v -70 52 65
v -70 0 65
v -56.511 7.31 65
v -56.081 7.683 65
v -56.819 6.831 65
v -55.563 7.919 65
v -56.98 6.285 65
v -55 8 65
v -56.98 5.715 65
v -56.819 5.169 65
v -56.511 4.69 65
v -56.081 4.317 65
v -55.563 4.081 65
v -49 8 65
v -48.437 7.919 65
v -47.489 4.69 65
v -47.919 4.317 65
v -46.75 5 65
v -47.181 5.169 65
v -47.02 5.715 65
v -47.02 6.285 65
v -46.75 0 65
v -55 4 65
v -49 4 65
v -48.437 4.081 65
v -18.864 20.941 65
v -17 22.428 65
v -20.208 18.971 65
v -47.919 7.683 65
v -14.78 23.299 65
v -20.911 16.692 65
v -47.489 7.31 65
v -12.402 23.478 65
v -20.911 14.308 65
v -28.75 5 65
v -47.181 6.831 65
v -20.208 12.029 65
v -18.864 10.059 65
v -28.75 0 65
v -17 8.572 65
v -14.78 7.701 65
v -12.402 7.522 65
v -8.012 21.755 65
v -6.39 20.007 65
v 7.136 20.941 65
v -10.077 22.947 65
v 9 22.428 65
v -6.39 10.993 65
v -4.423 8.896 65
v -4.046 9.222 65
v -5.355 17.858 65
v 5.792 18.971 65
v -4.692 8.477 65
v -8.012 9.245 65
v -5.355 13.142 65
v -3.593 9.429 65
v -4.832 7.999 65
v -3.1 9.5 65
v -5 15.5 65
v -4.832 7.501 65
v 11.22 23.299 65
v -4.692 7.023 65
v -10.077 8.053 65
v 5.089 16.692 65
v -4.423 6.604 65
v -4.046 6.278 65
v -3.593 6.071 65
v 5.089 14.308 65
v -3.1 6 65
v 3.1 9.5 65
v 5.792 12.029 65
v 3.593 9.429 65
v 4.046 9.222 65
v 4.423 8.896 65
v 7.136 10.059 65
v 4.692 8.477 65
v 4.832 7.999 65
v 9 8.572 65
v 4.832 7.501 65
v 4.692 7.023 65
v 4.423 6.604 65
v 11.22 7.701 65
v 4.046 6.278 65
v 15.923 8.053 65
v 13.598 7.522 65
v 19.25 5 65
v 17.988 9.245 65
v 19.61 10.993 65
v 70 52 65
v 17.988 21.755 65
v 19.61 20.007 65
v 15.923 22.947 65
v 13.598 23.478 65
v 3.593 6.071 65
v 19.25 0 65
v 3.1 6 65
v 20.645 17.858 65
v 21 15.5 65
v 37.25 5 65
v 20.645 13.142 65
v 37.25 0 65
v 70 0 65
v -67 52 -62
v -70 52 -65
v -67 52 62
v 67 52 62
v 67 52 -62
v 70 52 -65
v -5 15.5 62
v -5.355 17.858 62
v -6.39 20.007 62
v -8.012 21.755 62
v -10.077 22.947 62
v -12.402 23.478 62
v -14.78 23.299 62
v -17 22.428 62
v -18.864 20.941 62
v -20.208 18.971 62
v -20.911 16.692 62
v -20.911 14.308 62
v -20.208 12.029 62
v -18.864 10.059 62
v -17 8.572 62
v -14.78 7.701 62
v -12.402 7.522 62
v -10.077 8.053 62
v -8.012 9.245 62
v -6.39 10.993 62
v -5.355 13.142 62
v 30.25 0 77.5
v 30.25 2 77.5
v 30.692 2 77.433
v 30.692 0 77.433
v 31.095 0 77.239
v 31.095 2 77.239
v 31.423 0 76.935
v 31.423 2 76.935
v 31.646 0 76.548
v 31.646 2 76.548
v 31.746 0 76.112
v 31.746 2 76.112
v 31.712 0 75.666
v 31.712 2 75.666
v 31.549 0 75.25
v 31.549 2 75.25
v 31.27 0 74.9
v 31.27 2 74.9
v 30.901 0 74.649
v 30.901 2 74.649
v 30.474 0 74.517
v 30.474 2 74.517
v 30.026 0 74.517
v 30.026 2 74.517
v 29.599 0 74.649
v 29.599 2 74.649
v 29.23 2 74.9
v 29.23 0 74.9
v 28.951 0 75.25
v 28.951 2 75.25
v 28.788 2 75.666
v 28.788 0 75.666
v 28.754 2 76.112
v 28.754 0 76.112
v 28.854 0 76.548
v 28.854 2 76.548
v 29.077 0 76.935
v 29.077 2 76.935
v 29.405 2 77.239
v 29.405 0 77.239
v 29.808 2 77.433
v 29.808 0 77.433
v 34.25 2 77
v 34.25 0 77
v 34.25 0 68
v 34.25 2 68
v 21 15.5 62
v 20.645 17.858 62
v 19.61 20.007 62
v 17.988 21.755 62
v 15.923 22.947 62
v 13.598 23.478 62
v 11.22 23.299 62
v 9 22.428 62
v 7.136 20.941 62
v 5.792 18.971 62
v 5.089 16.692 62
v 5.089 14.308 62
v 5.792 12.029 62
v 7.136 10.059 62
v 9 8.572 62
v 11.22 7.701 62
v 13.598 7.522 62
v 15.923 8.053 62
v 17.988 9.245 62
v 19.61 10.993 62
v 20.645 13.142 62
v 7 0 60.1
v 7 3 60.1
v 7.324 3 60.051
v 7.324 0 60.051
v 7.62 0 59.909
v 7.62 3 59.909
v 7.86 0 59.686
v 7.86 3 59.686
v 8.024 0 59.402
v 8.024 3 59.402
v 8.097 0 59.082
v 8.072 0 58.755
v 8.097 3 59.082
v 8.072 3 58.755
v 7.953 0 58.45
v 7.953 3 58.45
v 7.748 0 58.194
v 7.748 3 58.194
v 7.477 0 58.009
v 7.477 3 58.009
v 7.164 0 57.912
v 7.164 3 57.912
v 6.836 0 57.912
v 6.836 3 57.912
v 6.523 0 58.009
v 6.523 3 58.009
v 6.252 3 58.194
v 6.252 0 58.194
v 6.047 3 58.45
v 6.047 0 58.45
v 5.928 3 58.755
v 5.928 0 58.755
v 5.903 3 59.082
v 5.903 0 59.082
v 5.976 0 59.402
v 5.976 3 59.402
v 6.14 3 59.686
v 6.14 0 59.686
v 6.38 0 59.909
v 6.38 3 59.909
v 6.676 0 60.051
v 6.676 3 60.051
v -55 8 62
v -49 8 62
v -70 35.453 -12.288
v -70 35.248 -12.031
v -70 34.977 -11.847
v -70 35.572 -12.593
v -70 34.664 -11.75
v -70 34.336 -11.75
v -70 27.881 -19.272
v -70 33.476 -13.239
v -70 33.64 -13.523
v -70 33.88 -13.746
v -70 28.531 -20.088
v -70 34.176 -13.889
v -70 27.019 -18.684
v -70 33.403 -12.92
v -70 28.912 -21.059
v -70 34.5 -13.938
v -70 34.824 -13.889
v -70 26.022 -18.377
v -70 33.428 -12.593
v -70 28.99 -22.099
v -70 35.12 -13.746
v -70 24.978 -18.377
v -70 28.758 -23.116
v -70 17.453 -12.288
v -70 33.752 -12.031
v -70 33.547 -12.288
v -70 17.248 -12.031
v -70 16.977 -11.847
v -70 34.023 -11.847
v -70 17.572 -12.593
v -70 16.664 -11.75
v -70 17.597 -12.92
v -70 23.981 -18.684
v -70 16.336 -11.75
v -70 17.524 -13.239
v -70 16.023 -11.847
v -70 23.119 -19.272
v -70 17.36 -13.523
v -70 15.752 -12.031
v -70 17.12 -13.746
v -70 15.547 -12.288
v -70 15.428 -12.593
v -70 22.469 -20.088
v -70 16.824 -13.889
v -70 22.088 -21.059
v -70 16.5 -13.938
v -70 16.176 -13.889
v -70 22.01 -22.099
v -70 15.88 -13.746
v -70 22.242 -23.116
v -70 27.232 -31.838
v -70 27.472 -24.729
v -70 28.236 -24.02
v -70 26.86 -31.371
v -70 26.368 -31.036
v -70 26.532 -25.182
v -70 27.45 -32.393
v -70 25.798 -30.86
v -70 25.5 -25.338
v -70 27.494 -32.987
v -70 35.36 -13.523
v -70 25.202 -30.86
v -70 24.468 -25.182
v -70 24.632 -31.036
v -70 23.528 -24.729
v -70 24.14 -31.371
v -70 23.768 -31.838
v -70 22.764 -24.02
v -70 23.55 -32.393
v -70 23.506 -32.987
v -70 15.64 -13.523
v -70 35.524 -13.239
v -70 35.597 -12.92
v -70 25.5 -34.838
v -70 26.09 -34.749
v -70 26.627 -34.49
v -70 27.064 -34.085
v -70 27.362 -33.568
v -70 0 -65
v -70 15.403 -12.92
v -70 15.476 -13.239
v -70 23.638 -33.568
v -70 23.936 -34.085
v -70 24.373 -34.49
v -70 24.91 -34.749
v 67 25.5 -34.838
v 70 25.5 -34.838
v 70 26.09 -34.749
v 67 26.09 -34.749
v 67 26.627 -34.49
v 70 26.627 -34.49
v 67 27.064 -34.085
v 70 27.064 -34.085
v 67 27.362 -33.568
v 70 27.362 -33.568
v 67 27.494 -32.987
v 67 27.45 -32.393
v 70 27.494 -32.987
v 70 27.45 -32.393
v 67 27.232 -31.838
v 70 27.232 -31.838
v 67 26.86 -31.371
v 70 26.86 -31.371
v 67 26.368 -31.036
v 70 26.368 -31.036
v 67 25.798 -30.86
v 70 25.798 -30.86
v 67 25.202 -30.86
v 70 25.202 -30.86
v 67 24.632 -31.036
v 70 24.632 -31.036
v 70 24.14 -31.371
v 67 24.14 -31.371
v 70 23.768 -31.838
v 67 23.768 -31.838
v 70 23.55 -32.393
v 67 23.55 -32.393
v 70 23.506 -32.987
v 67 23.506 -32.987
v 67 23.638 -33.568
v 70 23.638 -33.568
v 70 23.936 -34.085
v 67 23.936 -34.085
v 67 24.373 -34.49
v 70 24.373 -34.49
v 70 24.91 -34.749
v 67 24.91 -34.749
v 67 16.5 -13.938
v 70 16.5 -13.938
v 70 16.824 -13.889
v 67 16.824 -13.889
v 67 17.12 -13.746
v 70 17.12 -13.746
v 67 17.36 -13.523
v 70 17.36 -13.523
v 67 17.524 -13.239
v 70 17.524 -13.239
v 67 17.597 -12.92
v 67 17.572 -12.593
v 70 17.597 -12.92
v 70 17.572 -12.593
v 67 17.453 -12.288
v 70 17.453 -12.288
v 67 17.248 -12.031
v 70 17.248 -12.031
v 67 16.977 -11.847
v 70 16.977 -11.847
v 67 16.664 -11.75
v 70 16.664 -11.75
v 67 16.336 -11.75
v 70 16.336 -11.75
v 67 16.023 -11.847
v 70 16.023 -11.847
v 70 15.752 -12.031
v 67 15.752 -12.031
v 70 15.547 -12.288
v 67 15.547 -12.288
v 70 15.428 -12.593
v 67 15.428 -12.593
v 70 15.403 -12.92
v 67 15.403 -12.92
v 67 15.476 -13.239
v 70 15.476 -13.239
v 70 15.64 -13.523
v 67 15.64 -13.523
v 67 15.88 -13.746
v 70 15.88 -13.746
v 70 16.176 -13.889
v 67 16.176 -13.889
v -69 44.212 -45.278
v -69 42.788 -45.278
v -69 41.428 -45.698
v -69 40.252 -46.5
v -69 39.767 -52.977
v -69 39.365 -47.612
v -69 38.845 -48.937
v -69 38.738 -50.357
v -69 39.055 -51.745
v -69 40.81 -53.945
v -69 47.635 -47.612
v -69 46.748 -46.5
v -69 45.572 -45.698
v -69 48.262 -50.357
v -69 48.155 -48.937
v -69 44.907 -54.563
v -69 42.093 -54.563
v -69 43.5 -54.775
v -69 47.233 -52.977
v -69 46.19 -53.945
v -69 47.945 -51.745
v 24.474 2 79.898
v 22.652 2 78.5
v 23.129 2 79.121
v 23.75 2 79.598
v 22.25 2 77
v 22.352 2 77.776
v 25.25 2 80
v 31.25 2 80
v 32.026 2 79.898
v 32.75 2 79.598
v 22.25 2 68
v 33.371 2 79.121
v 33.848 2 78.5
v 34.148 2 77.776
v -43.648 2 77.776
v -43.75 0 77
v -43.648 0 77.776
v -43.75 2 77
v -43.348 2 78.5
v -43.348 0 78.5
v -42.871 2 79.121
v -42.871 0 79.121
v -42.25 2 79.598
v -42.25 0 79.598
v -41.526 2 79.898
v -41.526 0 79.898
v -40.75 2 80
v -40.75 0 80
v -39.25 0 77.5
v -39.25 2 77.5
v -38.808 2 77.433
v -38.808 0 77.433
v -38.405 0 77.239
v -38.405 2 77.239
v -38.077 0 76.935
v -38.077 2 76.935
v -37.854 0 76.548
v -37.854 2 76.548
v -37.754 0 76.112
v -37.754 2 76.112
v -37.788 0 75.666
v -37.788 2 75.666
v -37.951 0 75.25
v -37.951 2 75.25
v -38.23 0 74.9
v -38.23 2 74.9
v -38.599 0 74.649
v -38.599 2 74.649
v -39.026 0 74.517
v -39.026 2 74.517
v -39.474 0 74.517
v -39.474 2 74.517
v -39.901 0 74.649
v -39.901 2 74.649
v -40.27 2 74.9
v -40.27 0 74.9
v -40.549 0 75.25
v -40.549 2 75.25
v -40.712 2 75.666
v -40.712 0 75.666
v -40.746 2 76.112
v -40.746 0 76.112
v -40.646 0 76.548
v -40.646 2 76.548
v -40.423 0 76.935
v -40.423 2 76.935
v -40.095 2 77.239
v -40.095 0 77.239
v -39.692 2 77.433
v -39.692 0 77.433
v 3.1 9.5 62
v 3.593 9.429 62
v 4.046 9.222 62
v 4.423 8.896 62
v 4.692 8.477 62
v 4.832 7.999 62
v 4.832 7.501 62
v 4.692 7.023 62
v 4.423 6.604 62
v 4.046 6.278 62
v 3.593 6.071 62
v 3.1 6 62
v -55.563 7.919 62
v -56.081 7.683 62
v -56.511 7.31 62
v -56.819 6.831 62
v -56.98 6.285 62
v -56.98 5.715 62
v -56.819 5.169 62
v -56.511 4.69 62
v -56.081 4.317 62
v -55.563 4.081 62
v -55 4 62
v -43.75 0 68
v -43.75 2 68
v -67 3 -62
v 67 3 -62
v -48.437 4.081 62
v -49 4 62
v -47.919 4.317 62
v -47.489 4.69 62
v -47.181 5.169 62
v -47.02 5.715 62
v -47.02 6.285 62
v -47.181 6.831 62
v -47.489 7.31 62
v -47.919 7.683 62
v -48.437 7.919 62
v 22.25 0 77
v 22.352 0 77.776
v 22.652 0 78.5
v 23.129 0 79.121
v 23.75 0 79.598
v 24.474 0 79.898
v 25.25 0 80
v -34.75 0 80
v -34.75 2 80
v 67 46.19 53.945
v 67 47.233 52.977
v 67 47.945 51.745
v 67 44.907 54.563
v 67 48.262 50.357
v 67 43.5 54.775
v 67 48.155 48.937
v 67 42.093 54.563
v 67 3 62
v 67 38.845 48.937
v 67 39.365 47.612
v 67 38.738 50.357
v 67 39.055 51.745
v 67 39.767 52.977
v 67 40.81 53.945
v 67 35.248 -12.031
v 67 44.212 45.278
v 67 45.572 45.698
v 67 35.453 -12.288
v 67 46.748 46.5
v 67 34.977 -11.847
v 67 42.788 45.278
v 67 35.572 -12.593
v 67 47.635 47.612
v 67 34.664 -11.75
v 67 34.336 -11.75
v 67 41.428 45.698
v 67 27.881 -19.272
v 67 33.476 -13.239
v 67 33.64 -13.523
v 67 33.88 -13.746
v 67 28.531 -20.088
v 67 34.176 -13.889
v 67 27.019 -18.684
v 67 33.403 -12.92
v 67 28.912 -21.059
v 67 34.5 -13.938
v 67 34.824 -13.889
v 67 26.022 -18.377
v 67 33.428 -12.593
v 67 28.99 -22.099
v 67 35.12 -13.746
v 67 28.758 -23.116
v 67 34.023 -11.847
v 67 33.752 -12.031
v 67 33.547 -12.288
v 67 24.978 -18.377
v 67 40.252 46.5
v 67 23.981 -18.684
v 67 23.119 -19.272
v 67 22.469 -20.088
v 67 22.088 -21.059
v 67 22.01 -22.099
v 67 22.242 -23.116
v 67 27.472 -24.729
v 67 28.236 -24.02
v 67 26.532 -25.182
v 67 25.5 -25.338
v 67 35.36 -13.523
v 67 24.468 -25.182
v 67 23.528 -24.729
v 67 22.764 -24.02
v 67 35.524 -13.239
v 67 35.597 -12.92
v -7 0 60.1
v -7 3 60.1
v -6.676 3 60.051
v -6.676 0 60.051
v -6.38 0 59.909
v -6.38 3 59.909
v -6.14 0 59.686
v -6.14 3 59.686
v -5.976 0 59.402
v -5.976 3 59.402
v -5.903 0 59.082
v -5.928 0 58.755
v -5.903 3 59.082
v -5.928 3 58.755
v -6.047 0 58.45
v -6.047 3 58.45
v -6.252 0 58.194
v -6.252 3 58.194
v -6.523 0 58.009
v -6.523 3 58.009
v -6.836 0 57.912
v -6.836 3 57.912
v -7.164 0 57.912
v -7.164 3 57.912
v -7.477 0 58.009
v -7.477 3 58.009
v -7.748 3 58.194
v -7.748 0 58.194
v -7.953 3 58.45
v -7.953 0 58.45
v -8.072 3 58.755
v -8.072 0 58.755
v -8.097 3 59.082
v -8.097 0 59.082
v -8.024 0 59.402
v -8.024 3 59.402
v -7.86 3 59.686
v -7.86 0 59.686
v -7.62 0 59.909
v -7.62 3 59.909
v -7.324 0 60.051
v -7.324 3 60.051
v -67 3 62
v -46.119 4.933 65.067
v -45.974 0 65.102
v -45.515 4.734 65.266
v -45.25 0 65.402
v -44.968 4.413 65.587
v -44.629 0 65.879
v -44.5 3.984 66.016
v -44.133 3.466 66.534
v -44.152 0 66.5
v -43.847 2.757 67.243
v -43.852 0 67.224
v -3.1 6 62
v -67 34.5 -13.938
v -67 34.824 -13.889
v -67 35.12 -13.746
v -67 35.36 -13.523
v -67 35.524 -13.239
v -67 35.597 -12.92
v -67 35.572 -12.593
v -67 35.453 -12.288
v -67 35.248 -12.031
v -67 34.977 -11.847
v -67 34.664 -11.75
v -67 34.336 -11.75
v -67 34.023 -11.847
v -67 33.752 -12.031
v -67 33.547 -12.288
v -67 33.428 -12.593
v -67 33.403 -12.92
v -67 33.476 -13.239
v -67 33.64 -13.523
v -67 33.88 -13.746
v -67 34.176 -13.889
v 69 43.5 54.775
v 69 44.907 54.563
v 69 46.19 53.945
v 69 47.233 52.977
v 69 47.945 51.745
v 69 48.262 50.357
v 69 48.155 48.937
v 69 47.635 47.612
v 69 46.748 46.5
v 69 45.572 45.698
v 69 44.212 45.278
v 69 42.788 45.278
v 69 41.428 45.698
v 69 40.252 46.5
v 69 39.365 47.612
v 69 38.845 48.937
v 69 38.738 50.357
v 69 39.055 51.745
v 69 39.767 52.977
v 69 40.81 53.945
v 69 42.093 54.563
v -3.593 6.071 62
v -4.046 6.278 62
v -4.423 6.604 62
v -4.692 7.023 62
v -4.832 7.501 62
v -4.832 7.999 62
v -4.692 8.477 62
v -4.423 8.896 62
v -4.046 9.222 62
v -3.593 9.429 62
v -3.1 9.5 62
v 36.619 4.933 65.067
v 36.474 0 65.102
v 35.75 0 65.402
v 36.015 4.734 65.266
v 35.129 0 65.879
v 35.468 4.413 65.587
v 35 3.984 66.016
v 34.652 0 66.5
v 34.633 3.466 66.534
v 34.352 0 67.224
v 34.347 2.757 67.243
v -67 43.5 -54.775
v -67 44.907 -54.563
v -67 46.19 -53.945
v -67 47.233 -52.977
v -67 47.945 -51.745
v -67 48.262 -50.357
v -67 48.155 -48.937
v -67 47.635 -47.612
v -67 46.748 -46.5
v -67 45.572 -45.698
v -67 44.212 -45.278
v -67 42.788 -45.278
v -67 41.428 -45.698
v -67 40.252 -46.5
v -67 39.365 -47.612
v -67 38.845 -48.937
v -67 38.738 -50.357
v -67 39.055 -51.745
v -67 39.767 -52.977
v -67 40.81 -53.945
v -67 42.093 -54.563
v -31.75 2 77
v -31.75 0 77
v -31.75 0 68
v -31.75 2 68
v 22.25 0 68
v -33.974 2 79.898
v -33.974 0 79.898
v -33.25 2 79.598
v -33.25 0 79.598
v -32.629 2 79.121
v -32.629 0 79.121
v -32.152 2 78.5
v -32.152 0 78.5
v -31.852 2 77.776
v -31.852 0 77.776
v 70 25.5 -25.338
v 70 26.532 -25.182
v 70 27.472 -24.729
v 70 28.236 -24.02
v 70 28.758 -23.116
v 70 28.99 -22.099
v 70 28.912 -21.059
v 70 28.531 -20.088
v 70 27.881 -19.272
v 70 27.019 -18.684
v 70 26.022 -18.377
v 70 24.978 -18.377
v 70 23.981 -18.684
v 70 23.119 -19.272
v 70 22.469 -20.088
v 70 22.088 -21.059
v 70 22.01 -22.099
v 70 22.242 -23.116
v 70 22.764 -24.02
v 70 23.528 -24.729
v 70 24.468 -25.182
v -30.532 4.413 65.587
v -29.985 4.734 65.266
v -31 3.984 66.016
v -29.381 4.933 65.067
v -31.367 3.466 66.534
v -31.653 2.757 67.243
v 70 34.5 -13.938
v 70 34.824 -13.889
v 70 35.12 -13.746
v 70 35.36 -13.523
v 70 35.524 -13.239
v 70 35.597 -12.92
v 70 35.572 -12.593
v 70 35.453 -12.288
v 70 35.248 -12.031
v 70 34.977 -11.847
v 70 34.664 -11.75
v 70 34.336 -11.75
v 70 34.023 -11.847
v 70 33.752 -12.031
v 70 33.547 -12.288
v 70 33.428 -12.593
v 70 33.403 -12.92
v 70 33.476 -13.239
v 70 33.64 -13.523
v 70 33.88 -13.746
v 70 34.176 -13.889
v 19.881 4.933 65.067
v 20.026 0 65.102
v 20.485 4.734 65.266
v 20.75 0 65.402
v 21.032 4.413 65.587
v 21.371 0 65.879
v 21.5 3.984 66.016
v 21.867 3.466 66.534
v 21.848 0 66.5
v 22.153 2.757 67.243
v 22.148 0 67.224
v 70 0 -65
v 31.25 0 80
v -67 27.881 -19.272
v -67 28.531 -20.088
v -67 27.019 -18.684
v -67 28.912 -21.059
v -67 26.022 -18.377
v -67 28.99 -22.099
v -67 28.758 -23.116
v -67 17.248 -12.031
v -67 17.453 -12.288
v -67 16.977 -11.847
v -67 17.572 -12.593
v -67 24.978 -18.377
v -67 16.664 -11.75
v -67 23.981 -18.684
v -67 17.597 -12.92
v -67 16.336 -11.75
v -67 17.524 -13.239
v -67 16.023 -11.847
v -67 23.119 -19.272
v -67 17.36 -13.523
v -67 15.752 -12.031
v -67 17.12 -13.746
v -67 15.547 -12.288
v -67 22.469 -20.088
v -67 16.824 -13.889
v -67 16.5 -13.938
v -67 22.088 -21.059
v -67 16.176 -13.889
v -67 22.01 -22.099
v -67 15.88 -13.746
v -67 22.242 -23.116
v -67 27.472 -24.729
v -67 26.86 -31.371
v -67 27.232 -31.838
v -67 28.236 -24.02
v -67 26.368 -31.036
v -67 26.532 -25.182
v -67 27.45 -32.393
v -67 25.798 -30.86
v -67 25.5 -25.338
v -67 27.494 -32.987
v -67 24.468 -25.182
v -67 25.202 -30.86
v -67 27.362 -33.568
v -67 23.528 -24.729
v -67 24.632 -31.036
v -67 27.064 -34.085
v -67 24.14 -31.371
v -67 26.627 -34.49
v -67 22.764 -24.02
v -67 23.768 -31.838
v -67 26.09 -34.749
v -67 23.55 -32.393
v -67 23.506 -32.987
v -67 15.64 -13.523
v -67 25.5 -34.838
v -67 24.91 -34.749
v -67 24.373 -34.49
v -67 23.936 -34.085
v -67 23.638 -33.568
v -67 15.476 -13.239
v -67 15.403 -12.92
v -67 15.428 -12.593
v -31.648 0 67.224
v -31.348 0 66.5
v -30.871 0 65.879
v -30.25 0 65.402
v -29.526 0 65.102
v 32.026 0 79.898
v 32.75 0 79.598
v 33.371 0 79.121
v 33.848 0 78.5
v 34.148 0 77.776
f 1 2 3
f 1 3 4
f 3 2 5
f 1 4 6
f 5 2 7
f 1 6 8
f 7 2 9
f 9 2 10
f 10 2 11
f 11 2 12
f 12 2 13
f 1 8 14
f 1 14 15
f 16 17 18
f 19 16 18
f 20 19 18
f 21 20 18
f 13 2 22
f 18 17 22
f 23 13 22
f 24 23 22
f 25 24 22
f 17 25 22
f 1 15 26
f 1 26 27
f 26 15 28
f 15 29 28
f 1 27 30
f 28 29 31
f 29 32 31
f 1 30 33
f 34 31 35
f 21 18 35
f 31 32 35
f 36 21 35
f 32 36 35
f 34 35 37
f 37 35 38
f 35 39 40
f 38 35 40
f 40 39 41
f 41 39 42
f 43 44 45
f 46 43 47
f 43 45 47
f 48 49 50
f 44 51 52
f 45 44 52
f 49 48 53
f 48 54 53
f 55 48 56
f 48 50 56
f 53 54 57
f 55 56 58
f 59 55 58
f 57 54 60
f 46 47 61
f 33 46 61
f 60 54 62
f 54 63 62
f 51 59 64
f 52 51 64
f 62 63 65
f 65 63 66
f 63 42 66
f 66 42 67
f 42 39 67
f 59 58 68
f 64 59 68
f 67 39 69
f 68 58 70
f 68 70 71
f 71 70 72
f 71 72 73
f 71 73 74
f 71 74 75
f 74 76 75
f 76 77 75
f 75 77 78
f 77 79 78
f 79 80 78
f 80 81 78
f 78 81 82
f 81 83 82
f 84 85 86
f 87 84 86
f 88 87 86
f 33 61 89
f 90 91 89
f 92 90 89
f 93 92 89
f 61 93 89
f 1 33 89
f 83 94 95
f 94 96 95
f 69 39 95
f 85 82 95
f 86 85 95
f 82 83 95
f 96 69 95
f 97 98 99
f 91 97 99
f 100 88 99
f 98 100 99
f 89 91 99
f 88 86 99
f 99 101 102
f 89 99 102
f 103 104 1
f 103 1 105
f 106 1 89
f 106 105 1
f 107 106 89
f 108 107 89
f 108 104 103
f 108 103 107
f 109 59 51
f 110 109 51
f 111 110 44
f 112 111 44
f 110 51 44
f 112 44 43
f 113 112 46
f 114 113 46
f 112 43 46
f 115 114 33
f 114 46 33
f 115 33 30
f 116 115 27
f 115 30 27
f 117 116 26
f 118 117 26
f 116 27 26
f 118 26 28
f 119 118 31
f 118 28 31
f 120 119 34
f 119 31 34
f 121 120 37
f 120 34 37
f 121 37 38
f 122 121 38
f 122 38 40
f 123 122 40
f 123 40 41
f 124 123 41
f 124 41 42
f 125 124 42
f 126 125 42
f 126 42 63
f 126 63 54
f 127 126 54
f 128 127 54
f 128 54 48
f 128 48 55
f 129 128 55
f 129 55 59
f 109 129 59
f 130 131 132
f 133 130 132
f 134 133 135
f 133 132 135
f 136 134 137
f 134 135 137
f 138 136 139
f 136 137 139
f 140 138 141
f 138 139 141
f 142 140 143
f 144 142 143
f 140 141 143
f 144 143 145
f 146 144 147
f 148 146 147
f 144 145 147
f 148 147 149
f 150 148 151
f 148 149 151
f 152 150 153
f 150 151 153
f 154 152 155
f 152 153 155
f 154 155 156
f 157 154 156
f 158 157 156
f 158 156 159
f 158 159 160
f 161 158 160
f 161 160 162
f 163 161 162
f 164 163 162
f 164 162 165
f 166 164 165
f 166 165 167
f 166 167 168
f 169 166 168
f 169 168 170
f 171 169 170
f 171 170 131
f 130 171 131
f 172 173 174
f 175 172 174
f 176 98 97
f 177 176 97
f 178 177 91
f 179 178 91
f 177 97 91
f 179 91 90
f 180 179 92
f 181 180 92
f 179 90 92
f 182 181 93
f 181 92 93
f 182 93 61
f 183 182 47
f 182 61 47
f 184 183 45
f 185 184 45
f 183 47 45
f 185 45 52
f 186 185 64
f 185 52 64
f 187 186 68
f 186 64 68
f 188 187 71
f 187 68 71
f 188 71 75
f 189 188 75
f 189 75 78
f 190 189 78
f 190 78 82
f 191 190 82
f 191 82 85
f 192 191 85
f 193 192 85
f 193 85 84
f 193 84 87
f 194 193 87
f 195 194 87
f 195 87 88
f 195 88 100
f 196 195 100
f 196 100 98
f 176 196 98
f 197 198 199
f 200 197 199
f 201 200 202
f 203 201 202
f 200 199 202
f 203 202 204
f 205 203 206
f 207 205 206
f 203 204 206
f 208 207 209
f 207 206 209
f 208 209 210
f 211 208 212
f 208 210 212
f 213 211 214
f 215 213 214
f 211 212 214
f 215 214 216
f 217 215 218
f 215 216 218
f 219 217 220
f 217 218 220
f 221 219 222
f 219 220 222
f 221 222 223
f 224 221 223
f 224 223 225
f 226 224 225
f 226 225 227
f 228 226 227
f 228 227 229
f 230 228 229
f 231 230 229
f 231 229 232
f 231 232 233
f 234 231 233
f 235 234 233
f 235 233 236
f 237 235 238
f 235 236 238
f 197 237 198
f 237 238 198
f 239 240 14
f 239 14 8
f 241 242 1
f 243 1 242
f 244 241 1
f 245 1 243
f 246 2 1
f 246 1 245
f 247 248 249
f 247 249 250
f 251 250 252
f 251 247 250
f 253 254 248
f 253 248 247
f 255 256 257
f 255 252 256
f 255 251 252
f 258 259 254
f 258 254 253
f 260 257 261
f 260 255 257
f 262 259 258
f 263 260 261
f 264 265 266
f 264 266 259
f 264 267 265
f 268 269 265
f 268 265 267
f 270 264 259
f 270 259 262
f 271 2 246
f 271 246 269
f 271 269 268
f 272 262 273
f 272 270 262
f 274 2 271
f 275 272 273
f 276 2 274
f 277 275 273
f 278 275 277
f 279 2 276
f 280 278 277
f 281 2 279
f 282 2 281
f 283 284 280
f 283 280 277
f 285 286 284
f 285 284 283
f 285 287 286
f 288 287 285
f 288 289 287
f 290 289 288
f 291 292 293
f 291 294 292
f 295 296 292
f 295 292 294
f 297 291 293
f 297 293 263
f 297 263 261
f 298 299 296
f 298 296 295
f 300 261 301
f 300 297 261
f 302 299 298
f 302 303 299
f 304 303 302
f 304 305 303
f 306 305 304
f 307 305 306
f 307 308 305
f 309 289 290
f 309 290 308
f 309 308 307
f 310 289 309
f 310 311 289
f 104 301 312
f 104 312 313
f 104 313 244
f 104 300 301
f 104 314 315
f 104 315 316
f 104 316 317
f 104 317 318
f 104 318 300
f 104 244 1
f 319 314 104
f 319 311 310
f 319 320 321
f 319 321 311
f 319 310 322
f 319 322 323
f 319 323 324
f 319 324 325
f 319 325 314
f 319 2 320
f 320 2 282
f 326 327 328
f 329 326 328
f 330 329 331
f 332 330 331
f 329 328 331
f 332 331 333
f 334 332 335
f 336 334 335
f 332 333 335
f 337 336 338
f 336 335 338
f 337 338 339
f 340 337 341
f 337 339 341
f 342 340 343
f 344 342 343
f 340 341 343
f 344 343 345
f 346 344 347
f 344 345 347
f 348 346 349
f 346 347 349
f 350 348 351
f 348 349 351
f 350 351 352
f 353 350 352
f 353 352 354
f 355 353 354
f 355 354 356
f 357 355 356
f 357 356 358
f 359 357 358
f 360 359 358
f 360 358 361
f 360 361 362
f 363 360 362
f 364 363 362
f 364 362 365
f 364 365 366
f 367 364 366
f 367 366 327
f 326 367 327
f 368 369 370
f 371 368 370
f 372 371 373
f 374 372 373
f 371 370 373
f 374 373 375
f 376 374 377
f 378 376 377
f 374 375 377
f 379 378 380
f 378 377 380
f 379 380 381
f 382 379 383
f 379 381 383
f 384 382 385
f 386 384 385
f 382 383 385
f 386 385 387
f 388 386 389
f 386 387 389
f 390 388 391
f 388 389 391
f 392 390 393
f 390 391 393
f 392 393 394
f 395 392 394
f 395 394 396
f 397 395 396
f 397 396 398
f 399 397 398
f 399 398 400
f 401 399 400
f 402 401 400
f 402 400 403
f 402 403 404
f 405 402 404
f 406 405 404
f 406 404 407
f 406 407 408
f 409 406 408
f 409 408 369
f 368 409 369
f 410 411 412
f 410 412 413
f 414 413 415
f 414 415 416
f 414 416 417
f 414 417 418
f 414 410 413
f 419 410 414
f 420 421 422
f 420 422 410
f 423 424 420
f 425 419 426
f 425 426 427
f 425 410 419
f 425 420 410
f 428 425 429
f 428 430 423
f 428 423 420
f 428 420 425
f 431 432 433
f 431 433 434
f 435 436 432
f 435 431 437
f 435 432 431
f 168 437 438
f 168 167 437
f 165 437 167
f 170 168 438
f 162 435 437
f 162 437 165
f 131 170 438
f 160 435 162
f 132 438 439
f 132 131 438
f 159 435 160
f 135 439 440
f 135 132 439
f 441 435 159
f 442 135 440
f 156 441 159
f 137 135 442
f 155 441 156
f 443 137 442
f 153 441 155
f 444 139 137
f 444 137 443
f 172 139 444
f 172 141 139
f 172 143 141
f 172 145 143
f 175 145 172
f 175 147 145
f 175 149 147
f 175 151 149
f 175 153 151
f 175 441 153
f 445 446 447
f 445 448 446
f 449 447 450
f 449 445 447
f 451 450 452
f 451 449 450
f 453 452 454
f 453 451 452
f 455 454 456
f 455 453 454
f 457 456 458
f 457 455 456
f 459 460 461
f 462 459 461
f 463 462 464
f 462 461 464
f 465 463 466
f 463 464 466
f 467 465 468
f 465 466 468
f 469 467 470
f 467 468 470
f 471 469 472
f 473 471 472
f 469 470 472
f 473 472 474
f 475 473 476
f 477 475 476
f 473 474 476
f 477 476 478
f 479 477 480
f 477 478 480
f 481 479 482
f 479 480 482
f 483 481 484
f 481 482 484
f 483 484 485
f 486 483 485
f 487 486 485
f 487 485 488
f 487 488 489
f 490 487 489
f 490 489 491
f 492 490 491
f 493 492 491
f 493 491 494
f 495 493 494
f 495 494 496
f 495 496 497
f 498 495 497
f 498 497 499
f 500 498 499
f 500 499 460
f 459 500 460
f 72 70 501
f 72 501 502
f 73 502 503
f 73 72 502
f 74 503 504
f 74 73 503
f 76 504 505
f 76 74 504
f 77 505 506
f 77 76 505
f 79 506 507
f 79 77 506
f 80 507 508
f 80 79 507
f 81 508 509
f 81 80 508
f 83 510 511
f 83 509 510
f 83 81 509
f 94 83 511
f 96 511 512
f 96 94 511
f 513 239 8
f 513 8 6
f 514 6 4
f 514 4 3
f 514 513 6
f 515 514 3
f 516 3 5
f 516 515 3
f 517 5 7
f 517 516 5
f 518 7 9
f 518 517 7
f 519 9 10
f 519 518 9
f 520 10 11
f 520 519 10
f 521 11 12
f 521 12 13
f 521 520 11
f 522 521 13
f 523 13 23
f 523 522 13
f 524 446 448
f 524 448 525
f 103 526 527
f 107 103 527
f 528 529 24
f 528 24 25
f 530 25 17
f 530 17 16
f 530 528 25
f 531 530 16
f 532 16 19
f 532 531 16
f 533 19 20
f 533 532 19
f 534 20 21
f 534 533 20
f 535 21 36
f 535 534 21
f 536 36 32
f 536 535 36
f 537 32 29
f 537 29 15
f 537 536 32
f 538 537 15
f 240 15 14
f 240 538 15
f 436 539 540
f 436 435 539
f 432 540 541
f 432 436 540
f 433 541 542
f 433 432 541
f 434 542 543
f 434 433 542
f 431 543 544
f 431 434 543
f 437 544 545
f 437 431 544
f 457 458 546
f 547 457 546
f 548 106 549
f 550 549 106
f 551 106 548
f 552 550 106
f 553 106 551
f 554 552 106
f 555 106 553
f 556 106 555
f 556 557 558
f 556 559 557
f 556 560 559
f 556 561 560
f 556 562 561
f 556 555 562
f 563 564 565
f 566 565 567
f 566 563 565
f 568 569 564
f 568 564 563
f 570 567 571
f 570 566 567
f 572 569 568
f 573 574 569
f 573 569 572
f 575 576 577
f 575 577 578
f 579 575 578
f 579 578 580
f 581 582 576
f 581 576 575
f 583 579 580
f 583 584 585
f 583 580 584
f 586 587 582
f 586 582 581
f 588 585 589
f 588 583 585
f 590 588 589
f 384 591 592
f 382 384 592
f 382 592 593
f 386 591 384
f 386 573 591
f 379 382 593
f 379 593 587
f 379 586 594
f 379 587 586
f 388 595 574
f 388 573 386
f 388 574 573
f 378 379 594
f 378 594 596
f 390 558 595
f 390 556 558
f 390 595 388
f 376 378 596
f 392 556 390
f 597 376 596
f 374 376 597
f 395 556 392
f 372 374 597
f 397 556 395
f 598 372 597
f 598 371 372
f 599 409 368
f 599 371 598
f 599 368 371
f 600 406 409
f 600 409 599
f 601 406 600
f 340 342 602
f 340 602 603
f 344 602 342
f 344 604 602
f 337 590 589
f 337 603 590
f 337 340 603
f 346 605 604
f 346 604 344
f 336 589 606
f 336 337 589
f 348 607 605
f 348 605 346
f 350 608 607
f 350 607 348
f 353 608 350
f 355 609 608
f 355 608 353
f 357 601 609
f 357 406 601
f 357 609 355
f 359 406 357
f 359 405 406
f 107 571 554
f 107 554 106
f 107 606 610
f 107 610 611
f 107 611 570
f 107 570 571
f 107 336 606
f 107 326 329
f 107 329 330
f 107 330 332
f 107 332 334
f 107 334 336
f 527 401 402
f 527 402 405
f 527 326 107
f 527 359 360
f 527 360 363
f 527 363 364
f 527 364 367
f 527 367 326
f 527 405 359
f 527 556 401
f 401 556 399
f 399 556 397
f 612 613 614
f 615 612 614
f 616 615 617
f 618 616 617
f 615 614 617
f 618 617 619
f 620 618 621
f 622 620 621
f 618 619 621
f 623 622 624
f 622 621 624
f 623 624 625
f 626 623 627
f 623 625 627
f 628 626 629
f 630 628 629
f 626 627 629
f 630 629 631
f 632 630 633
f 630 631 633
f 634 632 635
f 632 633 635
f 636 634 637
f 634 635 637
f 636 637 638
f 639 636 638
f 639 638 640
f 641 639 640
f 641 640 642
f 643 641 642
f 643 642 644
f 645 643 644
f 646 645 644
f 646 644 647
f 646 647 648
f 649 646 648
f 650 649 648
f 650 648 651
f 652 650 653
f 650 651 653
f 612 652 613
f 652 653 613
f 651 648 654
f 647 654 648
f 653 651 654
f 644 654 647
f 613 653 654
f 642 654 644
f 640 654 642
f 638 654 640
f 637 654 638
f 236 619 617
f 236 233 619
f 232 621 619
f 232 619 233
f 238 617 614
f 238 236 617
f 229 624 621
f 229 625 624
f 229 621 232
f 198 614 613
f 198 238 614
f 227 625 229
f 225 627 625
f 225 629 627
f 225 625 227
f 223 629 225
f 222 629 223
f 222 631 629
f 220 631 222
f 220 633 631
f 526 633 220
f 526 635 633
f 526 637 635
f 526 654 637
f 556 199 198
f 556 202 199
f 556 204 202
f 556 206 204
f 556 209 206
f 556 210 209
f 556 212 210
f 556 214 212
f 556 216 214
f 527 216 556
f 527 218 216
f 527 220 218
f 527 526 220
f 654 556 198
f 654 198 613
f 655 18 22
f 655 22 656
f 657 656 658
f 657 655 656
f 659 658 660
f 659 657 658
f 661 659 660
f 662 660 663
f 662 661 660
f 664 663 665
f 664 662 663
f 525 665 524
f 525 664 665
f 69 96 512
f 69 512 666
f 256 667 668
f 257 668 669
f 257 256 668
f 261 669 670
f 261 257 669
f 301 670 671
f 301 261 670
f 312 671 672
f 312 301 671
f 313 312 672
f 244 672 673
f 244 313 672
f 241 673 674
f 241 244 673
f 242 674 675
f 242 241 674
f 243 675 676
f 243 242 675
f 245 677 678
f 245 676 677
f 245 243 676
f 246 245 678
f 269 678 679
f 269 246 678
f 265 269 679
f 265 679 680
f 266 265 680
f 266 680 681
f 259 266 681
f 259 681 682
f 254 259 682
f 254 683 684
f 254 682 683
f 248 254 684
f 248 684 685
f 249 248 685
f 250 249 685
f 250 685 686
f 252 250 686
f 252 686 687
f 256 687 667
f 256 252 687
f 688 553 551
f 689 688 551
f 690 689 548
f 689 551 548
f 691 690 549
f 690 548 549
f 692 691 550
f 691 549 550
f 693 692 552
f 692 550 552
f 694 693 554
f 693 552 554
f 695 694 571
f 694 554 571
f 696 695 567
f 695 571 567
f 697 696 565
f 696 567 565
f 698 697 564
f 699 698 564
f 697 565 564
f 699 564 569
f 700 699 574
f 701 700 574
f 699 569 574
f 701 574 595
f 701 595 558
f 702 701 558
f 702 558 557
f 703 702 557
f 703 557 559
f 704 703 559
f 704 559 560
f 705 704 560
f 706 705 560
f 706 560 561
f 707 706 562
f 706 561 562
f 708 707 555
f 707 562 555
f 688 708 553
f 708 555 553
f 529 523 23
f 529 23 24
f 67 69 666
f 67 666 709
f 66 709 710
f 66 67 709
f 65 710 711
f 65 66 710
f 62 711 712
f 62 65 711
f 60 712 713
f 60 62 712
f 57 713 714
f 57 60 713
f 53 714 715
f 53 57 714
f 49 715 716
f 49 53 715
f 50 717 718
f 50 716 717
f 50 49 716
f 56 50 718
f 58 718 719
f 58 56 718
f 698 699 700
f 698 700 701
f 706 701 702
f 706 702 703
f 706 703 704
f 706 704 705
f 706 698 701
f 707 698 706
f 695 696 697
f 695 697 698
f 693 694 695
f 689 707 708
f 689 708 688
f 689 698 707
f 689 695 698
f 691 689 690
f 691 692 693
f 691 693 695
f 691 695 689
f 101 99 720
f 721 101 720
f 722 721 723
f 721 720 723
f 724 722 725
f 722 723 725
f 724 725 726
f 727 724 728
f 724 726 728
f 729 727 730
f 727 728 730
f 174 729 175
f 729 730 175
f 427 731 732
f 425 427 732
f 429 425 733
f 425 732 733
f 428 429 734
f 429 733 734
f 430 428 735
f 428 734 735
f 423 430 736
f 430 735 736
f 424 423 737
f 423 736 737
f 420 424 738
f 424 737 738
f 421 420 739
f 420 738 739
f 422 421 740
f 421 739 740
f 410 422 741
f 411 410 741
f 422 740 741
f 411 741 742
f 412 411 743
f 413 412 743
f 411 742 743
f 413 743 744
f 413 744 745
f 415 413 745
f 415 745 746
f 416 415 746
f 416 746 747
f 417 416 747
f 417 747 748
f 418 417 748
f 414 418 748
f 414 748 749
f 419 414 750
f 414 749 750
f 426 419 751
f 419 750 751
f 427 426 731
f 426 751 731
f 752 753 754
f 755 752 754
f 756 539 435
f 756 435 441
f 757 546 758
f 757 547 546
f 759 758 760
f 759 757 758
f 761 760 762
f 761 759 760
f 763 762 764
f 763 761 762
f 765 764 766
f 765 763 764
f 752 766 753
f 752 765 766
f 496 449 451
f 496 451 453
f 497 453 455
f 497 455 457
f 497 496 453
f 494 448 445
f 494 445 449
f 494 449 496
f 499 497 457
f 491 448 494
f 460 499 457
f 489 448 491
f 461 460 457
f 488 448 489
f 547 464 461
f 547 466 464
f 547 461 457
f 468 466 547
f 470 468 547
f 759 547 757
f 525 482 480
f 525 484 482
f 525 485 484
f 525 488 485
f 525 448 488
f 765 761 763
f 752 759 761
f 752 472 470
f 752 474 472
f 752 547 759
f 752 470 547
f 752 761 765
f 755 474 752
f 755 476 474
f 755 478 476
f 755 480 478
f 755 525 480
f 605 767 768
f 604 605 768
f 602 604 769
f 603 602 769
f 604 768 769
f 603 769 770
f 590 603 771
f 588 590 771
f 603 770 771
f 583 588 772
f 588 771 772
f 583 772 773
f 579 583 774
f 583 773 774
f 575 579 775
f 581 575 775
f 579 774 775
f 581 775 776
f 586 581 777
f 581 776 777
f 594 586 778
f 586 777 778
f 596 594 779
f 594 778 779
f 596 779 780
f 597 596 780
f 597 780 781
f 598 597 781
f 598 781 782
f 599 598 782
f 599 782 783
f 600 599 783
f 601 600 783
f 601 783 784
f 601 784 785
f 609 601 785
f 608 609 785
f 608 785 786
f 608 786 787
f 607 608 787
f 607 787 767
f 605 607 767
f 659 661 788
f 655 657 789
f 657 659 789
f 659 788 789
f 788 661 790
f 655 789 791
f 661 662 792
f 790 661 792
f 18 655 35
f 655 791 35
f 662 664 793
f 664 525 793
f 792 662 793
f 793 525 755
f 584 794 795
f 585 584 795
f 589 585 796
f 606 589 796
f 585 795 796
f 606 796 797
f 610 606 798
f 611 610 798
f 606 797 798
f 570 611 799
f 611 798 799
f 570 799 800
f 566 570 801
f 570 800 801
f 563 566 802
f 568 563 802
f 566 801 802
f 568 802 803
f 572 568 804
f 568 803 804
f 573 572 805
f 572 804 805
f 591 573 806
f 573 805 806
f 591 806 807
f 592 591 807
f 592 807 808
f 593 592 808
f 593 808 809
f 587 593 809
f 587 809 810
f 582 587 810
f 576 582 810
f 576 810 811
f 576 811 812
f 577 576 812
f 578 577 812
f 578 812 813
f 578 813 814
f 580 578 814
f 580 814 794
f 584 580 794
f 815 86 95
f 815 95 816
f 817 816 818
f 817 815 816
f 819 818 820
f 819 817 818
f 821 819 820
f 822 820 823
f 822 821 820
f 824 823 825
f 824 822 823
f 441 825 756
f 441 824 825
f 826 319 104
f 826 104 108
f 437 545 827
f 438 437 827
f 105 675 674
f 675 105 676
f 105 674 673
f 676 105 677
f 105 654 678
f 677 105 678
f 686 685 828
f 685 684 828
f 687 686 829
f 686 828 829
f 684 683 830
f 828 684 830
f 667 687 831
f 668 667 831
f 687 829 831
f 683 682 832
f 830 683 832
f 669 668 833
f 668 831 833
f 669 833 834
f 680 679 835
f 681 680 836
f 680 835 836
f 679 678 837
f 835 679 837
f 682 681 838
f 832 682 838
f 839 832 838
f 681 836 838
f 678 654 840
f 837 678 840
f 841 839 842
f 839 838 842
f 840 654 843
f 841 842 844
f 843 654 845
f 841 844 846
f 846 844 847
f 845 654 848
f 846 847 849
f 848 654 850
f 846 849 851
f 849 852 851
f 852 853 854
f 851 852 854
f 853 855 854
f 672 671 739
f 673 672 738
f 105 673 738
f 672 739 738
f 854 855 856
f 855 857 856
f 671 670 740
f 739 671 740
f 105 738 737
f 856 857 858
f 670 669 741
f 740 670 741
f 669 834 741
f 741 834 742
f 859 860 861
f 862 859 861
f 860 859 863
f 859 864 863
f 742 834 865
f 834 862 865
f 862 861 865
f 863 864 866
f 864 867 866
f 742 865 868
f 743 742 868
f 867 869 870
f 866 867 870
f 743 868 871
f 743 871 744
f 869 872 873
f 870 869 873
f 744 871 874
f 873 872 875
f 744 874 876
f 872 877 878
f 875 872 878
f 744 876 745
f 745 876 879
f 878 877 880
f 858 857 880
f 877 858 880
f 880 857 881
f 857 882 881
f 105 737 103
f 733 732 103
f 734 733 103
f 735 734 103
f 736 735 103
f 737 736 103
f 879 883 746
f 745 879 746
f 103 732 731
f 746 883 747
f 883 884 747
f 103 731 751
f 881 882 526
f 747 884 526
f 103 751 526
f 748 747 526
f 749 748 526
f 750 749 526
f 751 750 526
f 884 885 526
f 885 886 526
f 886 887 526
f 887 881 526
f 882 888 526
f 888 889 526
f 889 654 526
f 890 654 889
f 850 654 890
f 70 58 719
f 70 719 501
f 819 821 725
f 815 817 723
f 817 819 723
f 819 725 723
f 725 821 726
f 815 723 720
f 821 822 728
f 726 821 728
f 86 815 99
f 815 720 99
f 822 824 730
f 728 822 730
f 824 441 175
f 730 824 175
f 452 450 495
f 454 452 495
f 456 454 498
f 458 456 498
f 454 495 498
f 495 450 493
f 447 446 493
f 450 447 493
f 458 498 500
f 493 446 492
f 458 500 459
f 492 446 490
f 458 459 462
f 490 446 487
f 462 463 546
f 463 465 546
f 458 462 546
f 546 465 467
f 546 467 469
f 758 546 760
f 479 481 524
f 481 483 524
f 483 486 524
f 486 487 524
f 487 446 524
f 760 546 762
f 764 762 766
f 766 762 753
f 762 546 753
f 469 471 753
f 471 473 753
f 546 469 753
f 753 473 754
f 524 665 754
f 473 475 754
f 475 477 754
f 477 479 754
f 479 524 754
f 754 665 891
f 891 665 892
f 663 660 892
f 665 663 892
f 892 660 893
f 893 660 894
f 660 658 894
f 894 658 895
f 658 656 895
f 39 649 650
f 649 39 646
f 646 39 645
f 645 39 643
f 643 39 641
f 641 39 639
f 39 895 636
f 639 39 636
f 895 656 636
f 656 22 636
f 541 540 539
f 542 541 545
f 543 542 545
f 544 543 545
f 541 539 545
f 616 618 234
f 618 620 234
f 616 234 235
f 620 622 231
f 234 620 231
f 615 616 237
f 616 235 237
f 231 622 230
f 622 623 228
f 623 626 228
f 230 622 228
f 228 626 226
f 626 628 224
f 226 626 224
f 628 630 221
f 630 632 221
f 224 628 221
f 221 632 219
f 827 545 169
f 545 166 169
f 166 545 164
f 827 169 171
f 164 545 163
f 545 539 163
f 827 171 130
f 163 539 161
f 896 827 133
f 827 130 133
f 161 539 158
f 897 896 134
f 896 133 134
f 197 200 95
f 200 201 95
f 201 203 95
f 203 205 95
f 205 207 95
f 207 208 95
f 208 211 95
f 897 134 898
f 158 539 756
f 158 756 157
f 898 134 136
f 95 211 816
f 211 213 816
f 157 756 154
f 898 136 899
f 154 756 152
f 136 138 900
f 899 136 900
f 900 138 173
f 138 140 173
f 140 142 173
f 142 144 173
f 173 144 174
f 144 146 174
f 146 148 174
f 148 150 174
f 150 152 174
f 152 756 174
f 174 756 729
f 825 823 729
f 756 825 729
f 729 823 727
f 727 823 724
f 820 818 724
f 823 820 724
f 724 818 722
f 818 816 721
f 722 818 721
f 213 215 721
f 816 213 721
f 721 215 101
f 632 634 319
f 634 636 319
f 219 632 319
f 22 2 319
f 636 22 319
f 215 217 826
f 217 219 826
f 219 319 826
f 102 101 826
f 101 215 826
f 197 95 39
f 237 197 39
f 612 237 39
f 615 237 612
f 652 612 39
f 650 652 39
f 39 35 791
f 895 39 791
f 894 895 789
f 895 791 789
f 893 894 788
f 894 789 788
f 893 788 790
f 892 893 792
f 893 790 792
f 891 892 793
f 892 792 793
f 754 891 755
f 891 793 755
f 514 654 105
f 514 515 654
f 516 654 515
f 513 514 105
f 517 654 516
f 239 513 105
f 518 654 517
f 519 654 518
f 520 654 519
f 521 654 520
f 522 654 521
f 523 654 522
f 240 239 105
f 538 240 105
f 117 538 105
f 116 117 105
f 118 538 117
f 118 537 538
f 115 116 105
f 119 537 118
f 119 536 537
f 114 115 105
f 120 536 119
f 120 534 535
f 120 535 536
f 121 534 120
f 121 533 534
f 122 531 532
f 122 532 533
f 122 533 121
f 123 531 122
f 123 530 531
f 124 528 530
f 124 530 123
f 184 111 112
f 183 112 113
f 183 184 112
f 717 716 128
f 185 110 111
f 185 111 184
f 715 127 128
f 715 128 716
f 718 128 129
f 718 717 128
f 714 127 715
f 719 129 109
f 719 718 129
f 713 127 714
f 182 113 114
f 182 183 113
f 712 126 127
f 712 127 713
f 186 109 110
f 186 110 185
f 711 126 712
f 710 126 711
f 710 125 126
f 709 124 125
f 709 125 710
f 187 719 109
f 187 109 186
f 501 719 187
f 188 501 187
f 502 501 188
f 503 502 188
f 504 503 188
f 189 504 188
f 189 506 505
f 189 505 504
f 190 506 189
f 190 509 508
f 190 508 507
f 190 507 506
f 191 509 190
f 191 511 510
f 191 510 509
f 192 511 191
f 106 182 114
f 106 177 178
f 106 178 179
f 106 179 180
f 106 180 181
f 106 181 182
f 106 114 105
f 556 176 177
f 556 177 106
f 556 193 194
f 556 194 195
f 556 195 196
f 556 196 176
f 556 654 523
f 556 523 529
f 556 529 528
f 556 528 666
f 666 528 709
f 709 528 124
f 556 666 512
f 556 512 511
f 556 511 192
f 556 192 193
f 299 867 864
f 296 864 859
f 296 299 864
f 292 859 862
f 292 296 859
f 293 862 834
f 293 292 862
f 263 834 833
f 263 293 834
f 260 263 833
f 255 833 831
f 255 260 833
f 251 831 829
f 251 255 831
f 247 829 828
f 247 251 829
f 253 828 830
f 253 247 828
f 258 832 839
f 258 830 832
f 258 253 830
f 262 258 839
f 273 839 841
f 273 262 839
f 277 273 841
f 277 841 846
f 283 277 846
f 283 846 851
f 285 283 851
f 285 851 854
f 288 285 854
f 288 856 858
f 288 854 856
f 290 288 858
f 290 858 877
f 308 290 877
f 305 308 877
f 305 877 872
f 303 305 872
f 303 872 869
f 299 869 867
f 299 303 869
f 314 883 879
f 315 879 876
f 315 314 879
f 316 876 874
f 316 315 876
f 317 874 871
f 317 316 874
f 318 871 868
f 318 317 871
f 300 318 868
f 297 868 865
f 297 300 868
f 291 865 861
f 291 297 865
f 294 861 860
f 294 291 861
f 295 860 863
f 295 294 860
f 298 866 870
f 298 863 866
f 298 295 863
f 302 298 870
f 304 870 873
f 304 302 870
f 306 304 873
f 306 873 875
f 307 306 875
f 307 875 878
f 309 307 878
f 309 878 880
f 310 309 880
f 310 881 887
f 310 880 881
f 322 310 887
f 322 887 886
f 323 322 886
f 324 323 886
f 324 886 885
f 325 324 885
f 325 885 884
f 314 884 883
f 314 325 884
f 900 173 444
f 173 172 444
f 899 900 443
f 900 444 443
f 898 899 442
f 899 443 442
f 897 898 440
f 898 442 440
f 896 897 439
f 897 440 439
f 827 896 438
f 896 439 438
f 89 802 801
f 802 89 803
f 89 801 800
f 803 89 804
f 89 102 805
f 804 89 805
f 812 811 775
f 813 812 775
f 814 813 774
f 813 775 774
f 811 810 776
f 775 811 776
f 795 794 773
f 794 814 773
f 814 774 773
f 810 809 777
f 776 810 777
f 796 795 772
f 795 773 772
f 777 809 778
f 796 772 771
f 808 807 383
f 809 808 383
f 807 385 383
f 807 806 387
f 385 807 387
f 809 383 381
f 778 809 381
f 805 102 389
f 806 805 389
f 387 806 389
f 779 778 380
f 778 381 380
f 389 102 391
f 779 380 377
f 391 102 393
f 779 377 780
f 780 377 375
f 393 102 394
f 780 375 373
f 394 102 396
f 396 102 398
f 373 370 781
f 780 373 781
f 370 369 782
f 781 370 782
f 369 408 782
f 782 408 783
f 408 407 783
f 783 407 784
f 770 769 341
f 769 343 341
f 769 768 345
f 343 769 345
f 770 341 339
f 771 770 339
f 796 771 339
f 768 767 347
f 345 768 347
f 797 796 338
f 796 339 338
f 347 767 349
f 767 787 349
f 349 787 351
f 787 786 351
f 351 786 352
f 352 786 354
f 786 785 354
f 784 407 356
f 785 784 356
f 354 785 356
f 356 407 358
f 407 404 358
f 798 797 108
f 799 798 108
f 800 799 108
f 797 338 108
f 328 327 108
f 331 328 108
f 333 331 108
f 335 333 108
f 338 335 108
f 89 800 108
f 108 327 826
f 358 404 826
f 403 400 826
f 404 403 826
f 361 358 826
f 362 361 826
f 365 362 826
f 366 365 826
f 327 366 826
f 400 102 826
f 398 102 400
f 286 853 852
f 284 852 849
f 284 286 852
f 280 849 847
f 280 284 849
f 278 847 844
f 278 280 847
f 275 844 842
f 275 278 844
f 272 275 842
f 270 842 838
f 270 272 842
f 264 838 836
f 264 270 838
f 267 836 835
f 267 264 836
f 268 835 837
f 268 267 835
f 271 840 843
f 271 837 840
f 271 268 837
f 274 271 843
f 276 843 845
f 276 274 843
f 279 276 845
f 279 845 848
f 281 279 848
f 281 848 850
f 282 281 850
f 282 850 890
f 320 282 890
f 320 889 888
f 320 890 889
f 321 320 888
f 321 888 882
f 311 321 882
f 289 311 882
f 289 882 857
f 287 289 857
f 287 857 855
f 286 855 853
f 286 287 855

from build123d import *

# Parameters (mm, degrees)
SKETCH1_W           = 140
SKETCH1_H           = 130
BOSS_EXTRUDE1_DEPTH = 52
SHELL1_T            = -3
SKETCH2_R           = 3.5
SKETCH2_R_2         = 2
SKETCH2_R_3         = 1.1
CUT_EXTRUDE1_DEPTH  = 137
SKETCH3_R           = 1.1
CUT_EXTRUDE2_DEPTH  = 3
CUT_EXTRUDE4_DEPTH  = 3
SKETCH7_R           = 4.775
CUT_EXTRUDE5_DEPTH  = 2
CIRPATTERN5_COUNT   = 2
SKETCH8_W           = 12
SKETCH8_H           = 15
BOSS_EXTRUDE2_DEPTH = 2
SKETCH11_R          = 1.5
CUT_EXTRUDE7_DEPTH  = 118.473401245
FILLET1_R           = 3
FILLET2_R           = 3
CHAMFER1_SIZE       = 3
SKETCH12_R          = 8
CUT_EXTRUDE8_DEPTH  = 10


with BuildPart() as part:
    # Sketch1 → Boss-Extrude1 (new body)
    with BuildSketch(Plane(origin=(0, 0, 0), x_dir=(1, 0, 0), z_dir=(0, 1, 0))):
        Rectangle(SKETCH1_W, SKETCH1_H)
    extrude(amount=BOSS_EXTRUDE1_DEPTH)

    # Shell1
    shell1_openings = [part.faces().sort_by_distance(p)[0] for p in [
        (0, 52, 0),
    ]]
    offset(amount=SHELL1_T, openings=shell1_openings, kind=Kind.INTERSECTION)

    # Sketch2 → Cut-Extrude1 (cut)
    with BuildSketch(Plane(origin=(70, 0, 0), x_dir=(0, 0, -1), z_dir=(1, 0, 0))):
        with Locations((21.837588157, 25.5)):
            Circle(SKETCH2_R)
        with Locations((32.837588157, 25.5)):
            Circle(SKETCH2_R_2)
        with Locations((12.837588157, 34.5)):
            Circle(SKETCH2_R_3)
        with Locations((12.837588157, 16.5)):
            Circle(SKETCH2_R_3)
    cut_extrude1 = extrude(amount=-CUT_EXTRUDE1_DEPTH, mode=Mode.SUBTRACT)

    # Mirror1: Cut-Extrude1 across plane
    add(cut_extrude1.mirror(Plane(origin=(0, 0, 0), x_dir=(0, 0, 1), z_dir=(1, 0, 0))), mode=Mode.SUBTRACT)

    # Sketch3 → Cut-Extrude2 (cut)
    with BuildSketch(Plane(origin=(0, 3, 0), x_dir=(1, 0, 0), z_dir=(0, 1, 0))):
        with Locations(Location((-7, -59, 0), (0, 0, 270))):
            Circle(SKETCH3_R)
        with Locations(Location((7, -59, 0), (0, 0, 270))):
            Circle(SKETCH3_R)
    extrude(amount=-CUT_EXTRUDE2_DEPTH, mode=Mode.SUBTRACT)

    # Sketch6 → Cut-Extrude4 (cut)
    with BuildSketch(Plane(origin=(0, 0, 62), x_dir=(-1, 0, 0), z_dir=(0, 0, -1))):
        with BuildLine():
            Line((55, 4), (49, 4))
            ThreePointArc((49, 4), (47, 6), (49, 8))
            Line((49, 8), (55, 8))
            ThreePointArc((55, 8), (57, 6), (55, 4))
        make_face()
    extrude(amount=-CUT_EXTRUDE4_DEPTH, mode=Mode.SUBTRACT)

    # Sketch7 → Cut-Extrude5 (cut)
    with BuildSketch(Plane(origin=(-67, 0, 0), x_dir=(0, 0, -1), z_dir=(1, 0, 0))):
        with Locations((50, 43.5)):
            Circle(SKETCH7_R)
    cut_extrude5 = extrude(amount=-CUT_EXTRUDE5_DEPTH, mode=Mode.SUBTRACT)

    # CirPattern5: Cut-Extrude5 ×2 about axis
    cirpattern5_axis = Axis((0, 54.6, 0), (0, -1, 0))
    for i in range(1, CIRPATTERN5_COUNT):
        add(cut_extrude5.rotate(cirpattern5_axis, i * 360 / CIRPATTERN5_COUNT), mode=Mode.SUBTRACT)

    # Sketch8 → Boss-Extrude2 (add)
    with BuildSketch(Plane(origin=(0, 0, 0), x_dir=(1, 0, 0), z_dir=(0, 1, 0))):
        with Locations((-37.75, -72.5)):
            Rectangle(SKETCH8_W, SKETCH8_H)
        with Locations((28.25, -72.5)):
            Rectangle(SKETCH8_W, SKETCH8_H)
    extrude(amount=BOSS_EXTRUDE2_DEPTH)

    # Sketch11 → Cut-Extrude7 (cut, through all)
    with BuildSketch(Plane(origin=(0, 2, 0), x_dir=(1, 0, 0), z_dir=(0, 1, 0))):
        with Locations(Location((-39.25, -76, 0), (0, 0, 270))):
            Circle(SKETCH11_R)
        with Locations(Location((30.25, -76, 0), (0, 0, 270))):
            Circle(SKETCH11_R)
    extrude(amount=-CUT_EXTRUDE7_DEPTH, mode=Mode.SUBTRACT)

    # Fillet1
    fillet1_edges = [part.edges().sort_by_distance(p)[0] for p in [
        (-43.75, 1, 65),
        (-43.75, 1, 80),
        (34.25, 1, 80),
        (34.25, 1, 65),
    ]]
    fillet(fillet1_edges, radius=FILLET1_R)

    # Fillet2
    fillet2_edges = [part.edges().sort_by_distance(p)[0] for p in [
        (-31.75, 1, 80),
        (-31.75, 1, 65),
        (22.25, 1, 80),
        (22.25, 1, 65),
    ]]
    fillet(fillet2_edges, radius=FILLET2_R)

    # Chamfer1
    chamfer1_edges = [part.edges().sort_by_distance(p)[0] for p in [
        (28.25, 2, 65),
        (-37.75, 2, 65),
    ]]
    chamfer(chamfer1_edges, length=CHAMFER1_SIZE)

    # Sketch12 → Cut-Extrude8 (cut)
    with BuildSketch(Plane.XY.offset(65)):
        with Locations((-13, 15.5)):
            Circle(SKETCH12_R)
        with Locations((13, 15.5)):
            Circle(SKETCH12_R)
        with BuildLine():
            Line((-3.1, 9.5), (3.1, 9.5))
            ThreePointArc((3.1, 9.5), (4.85, 7.75), (3.1, 6))
            Line((3.1, 6), (-3.1, 6))
            ThreePointArc((-3.1, 6), (-4.85, 7.75), (-3.1, 9.5))
        make_face()
    extrude(amount=-CUT_EXTRUDE8_DEPTH, mode=Mode.SUBTRACT)


solid = part.part
